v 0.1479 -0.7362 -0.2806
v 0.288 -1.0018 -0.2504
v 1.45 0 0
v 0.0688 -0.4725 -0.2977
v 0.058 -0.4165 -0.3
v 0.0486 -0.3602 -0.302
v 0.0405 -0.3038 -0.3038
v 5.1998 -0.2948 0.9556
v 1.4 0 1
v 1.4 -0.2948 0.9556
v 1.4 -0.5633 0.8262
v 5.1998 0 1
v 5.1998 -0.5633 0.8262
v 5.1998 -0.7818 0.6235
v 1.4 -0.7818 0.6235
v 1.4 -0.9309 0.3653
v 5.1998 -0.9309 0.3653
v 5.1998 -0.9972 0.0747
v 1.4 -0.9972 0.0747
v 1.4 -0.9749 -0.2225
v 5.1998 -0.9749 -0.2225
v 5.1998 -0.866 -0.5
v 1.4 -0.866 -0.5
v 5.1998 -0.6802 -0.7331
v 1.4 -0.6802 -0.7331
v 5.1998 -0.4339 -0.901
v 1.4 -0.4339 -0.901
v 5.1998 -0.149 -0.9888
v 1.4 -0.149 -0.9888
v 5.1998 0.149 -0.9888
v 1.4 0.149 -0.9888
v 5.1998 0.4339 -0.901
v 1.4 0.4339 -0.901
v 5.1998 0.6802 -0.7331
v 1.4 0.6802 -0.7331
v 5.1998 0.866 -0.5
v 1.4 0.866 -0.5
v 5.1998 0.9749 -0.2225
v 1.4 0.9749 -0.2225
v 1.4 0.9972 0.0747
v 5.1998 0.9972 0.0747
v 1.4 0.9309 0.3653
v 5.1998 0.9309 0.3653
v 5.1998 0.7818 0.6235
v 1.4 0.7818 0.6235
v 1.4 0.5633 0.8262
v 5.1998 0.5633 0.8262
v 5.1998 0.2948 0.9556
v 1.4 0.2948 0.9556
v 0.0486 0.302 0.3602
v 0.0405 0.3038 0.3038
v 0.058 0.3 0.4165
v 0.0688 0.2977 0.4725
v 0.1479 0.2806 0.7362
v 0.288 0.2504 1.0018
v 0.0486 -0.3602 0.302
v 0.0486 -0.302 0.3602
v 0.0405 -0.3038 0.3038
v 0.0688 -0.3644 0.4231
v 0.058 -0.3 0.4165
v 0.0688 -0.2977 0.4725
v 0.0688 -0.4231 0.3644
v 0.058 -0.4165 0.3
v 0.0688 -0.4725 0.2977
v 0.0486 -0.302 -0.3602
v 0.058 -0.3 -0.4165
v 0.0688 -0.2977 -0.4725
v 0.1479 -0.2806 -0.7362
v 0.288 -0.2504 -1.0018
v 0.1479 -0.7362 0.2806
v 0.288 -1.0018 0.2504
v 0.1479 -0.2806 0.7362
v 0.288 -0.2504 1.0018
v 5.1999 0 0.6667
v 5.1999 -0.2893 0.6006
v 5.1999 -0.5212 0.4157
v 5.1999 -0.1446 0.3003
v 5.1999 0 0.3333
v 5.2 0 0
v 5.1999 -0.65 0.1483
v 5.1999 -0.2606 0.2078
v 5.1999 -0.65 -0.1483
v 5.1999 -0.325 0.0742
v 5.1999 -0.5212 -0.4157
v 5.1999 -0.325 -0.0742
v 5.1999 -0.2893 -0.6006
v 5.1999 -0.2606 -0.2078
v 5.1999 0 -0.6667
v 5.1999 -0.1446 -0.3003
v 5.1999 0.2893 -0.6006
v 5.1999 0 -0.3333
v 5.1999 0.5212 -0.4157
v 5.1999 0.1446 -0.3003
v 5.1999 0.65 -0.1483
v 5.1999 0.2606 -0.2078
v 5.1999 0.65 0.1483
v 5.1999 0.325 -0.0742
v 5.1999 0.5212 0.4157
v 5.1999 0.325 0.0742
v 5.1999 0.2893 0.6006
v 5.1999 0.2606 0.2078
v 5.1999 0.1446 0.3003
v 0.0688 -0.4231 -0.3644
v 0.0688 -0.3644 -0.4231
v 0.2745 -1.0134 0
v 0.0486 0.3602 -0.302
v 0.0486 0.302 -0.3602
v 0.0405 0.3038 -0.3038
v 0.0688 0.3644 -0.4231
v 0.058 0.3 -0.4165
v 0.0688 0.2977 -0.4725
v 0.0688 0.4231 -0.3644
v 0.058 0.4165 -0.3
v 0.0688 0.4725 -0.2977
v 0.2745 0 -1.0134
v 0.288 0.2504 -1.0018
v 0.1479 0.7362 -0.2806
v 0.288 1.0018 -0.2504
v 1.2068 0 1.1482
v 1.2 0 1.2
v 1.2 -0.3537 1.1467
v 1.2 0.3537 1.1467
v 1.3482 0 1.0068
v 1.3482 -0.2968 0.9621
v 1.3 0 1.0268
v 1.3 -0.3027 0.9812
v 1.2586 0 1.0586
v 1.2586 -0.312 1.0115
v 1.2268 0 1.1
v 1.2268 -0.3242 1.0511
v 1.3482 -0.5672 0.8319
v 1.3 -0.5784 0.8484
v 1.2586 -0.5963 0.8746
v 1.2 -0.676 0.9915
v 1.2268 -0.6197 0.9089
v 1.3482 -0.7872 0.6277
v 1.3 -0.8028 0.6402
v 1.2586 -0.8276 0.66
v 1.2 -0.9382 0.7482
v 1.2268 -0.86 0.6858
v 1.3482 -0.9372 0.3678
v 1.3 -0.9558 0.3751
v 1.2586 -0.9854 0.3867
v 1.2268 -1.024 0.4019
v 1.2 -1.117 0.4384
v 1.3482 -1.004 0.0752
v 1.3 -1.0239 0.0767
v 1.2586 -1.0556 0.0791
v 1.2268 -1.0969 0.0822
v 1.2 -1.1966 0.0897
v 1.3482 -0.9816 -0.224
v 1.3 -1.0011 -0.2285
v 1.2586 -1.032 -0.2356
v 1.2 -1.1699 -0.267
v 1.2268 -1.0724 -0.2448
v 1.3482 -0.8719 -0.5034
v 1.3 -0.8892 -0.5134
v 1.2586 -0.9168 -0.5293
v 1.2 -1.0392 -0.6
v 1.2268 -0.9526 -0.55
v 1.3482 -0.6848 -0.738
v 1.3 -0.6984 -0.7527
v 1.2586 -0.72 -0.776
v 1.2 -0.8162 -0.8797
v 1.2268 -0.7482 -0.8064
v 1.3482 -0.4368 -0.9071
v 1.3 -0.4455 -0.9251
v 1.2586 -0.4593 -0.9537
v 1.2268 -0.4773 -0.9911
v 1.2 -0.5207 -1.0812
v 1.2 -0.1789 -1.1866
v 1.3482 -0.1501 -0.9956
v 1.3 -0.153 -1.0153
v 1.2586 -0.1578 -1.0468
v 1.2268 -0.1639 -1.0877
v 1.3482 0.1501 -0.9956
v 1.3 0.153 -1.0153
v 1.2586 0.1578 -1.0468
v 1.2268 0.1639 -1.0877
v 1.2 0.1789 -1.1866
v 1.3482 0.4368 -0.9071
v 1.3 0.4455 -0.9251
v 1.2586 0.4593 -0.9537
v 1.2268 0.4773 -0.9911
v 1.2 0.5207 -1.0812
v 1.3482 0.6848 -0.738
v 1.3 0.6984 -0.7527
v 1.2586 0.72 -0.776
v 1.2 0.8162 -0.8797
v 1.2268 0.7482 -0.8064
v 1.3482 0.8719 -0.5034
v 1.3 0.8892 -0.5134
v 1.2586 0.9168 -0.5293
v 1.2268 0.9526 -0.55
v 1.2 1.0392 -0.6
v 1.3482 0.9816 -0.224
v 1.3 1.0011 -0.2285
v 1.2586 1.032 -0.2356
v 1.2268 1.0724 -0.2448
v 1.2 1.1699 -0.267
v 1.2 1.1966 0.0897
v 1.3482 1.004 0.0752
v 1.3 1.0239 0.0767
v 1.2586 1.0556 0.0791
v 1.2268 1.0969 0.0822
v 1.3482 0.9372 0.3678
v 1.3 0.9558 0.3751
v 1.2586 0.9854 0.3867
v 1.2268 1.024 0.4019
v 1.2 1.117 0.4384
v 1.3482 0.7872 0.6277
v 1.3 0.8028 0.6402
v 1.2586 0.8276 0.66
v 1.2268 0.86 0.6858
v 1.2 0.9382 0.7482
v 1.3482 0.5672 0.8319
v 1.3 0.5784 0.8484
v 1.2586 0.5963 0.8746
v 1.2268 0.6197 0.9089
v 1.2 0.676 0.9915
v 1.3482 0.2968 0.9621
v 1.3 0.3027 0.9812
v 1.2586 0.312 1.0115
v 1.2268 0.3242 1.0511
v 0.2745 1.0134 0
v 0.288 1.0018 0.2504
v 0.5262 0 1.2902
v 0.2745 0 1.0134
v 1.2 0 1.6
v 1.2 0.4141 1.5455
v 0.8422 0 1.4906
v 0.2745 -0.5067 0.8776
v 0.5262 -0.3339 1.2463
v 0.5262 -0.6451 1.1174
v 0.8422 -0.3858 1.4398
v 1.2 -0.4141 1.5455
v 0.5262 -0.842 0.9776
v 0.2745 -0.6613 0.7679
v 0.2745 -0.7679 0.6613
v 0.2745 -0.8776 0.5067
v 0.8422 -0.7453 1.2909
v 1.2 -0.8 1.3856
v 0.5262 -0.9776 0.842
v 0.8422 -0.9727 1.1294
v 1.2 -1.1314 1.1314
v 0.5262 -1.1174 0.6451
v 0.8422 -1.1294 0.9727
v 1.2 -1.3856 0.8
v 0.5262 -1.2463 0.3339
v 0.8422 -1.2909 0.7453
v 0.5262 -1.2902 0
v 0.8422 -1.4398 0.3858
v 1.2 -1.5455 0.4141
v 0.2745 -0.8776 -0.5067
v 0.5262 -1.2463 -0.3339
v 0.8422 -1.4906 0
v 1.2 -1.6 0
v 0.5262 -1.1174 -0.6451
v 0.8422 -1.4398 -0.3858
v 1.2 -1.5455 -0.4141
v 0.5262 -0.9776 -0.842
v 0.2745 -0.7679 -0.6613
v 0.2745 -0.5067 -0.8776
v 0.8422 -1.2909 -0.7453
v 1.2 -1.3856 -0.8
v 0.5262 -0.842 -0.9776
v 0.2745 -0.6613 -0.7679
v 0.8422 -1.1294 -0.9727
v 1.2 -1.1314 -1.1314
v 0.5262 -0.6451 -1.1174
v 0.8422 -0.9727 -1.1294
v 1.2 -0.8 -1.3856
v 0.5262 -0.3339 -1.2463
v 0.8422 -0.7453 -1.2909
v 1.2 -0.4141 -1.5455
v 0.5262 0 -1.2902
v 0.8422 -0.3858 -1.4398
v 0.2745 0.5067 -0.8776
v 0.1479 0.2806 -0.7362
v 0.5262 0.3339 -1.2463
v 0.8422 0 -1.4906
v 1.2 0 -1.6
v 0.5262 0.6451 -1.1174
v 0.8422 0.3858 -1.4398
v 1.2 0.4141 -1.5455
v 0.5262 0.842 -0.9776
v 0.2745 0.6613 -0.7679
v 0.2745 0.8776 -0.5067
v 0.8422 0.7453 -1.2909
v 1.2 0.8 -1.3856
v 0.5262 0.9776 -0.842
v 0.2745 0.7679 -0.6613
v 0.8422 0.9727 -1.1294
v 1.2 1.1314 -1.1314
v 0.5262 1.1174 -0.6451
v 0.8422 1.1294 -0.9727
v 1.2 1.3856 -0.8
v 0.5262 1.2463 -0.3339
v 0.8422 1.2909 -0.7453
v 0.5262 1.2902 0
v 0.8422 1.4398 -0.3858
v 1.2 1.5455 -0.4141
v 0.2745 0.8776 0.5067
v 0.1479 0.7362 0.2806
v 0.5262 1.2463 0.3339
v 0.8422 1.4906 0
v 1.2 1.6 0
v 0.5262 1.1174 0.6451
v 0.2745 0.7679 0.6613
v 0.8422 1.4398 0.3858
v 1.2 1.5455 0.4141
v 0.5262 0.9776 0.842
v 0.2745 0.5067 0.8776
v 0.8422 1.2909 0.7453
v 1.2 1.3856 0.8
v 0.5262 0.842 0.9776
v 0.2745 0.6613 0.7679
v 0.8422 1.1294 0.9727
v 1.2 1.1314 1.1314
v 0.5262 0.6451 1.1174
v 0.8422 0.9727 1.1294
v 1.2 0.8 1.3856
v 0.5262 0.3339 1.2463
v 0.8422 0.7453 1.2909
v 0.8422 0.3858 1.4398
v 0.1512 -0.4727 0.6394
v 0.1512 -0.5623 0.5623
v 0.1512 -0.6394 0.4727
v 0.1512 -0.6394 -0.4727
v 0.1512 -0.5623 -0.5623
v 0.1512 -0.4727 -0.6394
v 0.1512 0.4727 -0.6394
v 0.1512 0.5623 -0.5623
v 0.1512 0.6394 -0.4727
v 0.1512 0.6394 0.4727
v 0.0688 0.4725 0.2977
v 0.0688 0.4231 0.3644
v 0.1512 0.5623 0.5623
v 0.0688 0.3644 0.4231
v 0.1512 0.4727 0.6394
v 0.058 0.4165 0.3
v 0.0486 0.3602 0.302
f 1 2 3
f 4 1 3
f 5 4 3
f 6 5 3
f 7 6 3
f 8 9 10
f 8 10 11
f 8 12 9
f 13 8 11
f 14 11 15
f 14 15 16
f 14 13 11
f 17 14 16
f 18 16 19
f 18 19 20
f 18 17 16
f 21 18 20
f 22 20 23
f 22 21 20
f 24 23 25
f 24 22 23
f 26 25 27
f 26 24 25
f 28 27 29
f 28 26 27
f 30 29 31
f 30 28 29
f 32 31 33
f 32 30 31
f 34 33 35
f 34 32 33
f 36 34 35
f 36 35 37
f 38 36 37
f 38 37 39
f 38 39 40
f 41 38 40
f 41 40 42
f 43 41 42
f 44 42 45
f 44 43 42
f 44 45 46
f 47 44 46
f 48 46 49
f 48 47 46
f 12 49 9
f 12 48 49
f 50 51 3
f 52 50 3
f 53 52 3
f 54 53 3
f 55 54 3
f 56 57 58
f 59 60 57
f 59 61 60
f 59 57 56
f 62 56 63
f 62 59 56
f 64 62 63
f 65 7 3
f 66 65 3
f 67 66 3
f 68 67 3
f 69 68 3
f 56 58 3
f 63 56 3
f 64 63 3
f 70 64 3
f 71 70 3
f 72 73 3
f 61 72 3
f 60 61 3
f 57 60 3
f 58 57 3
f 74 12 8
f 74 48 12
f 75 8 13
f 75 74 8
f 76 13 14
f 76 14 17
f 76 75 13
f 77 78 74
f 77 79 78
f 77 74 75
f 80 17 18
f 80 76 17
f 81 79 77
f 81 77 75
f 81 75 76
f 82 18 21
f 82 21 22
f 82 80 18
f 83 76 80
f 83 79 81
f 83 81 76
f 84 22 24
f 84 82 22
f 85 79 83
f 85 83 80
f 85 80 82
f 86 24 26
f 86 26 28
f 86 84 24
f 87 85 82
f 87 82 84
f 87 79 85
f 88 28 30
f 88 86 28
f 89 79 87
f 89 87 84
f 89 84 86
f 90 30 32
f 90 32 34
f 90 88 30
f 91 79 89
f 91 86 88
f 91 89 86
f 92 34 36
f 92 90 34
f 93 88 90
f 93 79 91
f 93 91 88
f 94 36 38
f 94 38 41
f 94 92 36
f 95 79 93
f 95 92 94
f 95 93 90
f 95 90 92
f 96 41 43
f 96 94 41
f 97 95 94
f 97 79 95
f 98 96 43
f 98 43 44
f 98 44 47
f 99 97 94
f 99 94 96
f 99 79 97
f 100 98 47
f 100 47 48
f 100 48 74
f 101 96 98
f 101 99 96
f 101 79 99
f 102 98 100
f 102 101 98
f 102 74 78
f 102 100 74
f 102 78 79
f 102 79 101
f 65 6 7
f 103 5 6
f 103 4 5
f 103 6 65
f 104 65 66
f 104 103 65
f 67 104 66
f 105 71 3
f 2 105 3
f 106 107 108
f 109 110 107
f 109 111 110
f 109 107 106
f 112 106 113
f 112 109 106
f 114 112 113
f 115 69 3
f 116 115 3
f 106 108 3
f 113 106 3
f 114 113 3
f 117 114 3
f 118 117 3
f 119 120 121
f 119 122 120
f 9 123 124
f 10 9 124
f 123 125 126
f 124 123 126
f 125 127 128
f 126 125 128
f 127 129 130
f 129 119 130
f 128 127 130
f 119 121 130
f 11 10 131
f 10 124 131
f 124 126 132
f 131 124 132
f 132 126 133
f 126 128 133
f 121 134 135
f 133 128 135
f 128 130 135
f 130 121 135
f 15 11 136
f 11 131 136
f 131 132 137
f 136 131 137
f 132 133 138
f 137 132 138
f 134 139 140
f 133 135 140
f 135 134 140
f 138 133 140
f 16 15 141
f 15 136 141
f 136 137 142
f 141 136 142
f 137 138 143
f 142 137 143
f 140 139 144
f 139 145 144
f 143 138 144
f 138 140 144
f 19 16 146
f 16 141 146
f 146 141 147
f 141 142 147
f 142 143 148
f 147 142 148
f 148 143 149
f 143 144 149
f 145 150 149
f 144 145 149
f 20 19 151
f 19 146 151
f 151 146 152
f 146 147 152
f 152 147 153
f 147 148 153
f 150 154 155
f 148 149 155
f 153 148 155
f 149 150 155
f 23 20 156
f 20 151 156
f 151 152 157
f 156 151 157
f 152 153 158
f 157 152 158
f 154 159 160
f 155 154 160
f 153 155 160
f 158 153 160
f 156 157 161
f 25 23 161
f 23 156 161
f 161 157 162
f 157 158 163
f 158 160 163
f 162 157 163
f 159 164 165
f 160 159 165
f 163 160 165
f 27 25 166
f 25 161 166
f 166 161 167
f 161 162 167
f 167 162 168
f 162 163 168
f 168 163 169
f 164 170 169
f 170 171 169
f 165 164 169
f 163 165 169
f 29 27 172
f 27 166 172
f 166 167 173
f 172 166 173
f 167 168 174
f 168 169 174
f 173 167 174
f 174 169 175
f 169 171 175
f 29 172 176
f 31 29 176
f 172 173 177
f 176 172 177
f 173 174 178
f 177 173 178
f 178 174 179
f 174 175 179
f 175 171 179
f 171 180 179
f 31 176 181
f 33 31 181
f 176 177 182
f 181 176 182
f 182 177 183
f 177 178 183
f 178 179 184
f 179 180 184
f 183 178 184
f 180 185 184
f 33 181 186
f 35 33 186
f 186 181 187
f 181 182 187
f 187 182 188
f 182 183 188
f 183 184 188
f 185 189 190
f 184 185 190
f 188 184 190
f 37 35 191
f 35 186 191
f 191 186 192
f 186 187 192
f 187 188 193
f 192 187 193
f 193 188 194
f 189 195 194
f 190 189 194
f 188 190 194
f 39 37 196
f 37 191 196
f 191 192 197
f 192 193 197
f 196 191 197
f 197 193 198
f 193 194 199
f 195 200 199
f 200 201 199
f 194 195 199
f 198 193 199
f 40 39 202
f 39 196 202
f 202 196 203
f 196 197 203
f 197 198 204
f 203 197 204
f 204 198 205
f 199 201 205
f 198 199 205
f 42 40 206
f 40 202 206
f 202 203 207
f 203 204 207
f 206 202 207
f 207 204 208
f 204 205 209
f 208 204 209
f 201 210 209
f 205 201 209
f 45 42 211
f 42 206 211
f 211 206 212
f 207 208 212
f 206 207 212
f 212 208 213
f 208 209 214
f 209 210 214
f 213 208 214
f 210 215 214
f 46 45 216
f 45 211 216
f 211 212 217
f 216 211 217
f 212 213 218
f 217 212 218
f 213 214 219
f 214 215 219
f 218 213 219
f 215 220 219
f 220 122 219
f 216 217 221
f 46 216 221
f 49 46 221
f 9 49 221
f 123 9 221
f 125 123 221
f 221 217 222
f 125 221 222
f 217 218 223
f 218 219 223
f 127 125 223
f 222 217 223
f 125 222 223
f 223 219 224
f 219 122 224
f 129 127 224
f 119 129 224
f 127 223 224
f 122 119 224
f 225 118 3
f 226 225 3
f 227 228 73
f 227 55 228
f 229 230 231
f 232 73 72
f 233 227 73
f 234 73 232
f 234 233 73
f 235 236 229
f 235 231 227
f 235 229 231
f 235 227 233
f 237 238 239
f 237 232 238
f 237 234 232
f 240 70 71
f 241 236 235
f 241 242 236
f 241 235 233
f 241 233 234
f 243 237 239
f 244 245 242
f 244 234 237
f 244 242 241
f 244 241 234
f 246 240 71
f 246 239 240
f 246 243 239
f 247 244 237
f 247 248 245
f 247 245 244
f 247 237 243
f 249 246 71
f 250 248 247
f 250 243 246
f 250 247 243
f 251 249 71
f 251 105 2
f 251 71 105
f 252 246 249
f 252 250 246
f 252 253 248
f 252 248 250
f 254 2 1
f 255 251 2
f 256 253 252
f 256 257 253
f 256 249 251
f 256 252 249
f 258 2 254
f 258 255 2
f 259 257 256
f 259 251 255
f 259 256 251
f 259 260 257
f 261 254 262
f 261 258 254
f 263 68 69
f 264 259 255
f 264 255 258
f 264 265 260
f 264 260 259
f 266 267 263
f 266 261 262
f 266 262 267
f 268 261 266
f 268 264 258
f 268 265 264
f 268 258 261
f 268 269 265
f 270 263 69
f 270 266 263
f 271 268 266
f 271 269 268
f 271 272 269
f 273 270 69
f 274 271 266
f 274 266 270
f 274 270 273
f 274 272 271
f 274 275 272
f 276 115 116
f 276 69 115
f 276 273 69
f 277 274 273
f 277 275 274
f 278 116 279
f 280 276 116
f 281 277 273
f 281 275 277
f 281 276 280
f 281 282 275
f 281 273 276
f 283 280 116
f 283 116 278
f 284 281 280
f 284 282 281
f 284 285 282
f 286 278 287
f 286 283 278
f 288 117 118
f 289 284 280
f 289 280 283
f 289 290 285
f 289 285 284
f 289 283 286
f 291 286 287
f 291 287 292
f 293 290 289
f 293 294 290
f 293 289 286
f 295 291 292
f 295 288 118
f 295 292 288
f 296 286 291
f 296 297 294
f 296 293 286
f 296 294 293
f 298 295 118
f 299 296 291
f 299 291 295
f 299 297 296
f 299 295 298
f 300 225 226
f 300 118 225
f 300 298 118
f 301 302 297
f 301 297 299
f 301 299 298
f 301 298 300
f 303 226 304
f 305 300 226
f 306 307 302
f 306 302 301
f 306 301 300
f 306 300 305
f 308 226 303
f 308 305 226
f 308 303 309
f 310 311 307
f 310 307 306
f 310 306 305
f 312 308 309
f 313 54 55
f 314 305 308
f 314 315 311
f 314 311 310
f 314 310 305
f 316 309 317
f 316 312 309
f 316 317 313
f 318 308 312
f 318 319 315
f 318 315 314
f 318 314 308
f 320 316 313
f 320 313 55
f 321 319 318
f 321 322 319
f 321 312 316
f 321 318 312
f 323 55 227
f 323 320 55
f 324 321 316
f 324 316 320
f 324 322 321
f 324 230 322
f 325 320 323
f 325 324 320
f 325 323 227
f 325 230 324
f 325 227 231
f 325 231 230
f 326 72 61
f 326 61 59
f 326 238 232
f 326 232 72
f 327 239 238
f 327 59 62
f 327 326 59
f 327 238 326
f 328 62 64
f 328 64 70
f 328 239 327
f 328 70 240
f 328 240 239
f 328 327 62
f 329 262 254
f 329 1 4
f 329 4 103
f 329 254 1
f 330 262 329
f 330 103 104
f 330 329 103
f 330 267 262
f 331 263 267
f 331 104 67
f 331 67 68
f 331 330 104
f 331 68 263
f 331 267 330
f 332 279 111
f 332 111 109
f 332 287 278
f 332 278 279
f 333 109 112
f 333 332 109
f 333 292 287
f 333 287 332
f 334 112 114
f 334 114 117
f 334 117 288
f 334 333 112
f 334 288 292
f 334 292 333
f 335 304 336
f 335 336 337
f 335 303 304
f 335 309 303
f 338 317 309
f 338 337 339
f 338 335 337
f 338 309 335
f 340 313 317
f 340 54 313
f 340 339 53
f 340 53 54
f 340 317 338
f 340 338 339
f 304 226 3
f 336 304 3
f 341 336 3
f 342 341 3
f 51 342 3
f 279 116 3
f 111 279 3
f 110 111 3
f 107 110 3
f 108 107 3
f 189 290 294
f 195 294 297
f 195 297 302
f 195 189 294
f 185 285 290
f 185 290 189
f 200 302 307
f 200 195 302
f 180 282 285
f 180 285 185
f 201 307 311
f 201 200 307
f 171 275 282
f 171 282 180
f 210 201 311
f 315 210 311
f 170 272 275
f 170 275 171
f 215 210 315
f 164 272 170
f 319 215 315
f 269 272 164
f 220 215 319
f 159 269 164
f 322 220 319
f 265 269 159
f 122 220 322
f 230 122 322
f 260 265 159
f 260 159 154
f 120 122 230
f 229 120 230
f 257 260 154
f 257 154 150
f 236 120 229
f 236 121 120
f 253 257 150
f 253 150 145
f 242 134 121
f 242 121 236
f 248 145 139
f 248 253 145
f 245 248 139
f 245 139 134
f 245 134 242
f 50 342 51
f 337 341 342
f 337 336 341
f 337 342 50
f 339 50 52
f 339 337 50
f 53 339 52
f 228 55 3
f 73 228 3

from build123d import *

# Parameters (mm, degrees)
FILLET2_R = 0.2


with BuildPart() as part:
    # Sketch1 → Revolve1 (revolve)
    with BuildSketch(Plane(origin=(0, 0, 0), x_dir=(1, 0, 0), z_dir=(0, 1, 0)), mode=Mode.PRIVATE) as revolve1_sk:
        with BuildLine():
            Line((1.2, 1), (5.2, 1))
            Line((5.2, 1), (5.2, 0))
            Line((5.2, 0), (0, 0))
            ThreePointArc((0, 0), (0.017270008, 0.28132505), (0.068820682, 0.55842533))
            ThreePointArc((0.068820682, 0.55842533), (0.478612062, 1.248413967), (1.2, 1.6))
            Line((1.2, 1.6), (1.2, 1))
        make_face()
    revolve(revolve1_sk.sketch.rotate(Axis((-13.629268293, 0, 0), (1, 0, 0)), 180), axis=Axis((-13.629268293, 0, 0), (1, 0, 0)))

    # Fillet2
    fillet2_edges = [part.edges().sort_by_distance(p)[0] for p in [
        (1.2, 0, -1),
    ]]
    fillet(fillet2_edges, radius=FILLET2_R)

    # Sketch4 → Cut-Revolve1 (revolve, cut)
    with BuildSketch(Plane(origin=(0, 0, 0), x_dir=(1, 0, 0), z_dir=(0, 1, 0)), mode=Mode.PRIVATE) as cut_revolve1_sk:
        Polygon((5.933454633, 0), (5.933454633, 21), (5.196334809, 21), (5.2, 0), align=None)
    revolve(cut_revolve1_sk.sketch.rotate(Axis((4.782773752, 0, 0), (1, 0, 0)), 180), axis=Axis((4.782773752, 0, 0), (1, 0, 0)), mode=Mode.SUBTRACT)

    # Sketch2 → Cut-Loft1 section 0
    with BuildSketch(Plane(origin=(0, 0, 0), x_dir=(0, 0, -1), z_dir=(1, 0, 0)), mode=Mode.PRIVATE) as cut_loft1_s0:
        with BuildLine():
            Line((-0.3125, 0.3125), (-1.25, 0.3125))
            Line((-1.25, 0.3125), (-1.25, -0.3125))
            Line((-1.25, -0.3125), (-0.3125, -0.3125))
            Line((-0.3125, -0.3125), (-0.3125, -1.25))
            Line((-0.3125, -1.25), (0.3125, -1.25))
            Line((0.3125, -1.25), (0.3125, -0.3125))
            Line((0.3125, -0.3125), (1.25, -0.3125))
            Line((1.25, -0.3125), (1.25, 0.3125))
            Line((1.25, 0.3125), (0.3125, 0.3125))
            Line((0.3125, 0.3125), (0.3125, 1.25))
            Line((0.3125, 1.25), (-0.3125, 1.25))
            Line((-0.3125, 1.25), (-0.3125, 0.3125))
        make_face()
    loft([Vertex(1.45, 0, 0), cut_loft1_s0.sketch], mode=Mode.SUBTRACT)


solid = part.part
